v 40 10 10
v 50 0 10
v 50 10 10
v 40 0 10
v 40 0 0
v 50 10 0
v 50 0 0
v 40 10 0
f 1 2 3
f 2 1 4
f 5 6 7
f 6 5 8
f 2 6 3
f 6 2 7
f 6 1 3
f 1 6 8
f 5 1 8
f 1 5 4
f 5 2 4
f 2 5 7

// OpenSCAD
// Failure class 2: transform composition order
// The order of transforms matters: rotate then translate vs translate then rotate
// produce different results. This fixture applies transforms in the wrong
// order, producing a shape at an unexpected location.
translate([50, 0, 0])
rotate([0, 0, 90])
cube([10, 10, 10]);
